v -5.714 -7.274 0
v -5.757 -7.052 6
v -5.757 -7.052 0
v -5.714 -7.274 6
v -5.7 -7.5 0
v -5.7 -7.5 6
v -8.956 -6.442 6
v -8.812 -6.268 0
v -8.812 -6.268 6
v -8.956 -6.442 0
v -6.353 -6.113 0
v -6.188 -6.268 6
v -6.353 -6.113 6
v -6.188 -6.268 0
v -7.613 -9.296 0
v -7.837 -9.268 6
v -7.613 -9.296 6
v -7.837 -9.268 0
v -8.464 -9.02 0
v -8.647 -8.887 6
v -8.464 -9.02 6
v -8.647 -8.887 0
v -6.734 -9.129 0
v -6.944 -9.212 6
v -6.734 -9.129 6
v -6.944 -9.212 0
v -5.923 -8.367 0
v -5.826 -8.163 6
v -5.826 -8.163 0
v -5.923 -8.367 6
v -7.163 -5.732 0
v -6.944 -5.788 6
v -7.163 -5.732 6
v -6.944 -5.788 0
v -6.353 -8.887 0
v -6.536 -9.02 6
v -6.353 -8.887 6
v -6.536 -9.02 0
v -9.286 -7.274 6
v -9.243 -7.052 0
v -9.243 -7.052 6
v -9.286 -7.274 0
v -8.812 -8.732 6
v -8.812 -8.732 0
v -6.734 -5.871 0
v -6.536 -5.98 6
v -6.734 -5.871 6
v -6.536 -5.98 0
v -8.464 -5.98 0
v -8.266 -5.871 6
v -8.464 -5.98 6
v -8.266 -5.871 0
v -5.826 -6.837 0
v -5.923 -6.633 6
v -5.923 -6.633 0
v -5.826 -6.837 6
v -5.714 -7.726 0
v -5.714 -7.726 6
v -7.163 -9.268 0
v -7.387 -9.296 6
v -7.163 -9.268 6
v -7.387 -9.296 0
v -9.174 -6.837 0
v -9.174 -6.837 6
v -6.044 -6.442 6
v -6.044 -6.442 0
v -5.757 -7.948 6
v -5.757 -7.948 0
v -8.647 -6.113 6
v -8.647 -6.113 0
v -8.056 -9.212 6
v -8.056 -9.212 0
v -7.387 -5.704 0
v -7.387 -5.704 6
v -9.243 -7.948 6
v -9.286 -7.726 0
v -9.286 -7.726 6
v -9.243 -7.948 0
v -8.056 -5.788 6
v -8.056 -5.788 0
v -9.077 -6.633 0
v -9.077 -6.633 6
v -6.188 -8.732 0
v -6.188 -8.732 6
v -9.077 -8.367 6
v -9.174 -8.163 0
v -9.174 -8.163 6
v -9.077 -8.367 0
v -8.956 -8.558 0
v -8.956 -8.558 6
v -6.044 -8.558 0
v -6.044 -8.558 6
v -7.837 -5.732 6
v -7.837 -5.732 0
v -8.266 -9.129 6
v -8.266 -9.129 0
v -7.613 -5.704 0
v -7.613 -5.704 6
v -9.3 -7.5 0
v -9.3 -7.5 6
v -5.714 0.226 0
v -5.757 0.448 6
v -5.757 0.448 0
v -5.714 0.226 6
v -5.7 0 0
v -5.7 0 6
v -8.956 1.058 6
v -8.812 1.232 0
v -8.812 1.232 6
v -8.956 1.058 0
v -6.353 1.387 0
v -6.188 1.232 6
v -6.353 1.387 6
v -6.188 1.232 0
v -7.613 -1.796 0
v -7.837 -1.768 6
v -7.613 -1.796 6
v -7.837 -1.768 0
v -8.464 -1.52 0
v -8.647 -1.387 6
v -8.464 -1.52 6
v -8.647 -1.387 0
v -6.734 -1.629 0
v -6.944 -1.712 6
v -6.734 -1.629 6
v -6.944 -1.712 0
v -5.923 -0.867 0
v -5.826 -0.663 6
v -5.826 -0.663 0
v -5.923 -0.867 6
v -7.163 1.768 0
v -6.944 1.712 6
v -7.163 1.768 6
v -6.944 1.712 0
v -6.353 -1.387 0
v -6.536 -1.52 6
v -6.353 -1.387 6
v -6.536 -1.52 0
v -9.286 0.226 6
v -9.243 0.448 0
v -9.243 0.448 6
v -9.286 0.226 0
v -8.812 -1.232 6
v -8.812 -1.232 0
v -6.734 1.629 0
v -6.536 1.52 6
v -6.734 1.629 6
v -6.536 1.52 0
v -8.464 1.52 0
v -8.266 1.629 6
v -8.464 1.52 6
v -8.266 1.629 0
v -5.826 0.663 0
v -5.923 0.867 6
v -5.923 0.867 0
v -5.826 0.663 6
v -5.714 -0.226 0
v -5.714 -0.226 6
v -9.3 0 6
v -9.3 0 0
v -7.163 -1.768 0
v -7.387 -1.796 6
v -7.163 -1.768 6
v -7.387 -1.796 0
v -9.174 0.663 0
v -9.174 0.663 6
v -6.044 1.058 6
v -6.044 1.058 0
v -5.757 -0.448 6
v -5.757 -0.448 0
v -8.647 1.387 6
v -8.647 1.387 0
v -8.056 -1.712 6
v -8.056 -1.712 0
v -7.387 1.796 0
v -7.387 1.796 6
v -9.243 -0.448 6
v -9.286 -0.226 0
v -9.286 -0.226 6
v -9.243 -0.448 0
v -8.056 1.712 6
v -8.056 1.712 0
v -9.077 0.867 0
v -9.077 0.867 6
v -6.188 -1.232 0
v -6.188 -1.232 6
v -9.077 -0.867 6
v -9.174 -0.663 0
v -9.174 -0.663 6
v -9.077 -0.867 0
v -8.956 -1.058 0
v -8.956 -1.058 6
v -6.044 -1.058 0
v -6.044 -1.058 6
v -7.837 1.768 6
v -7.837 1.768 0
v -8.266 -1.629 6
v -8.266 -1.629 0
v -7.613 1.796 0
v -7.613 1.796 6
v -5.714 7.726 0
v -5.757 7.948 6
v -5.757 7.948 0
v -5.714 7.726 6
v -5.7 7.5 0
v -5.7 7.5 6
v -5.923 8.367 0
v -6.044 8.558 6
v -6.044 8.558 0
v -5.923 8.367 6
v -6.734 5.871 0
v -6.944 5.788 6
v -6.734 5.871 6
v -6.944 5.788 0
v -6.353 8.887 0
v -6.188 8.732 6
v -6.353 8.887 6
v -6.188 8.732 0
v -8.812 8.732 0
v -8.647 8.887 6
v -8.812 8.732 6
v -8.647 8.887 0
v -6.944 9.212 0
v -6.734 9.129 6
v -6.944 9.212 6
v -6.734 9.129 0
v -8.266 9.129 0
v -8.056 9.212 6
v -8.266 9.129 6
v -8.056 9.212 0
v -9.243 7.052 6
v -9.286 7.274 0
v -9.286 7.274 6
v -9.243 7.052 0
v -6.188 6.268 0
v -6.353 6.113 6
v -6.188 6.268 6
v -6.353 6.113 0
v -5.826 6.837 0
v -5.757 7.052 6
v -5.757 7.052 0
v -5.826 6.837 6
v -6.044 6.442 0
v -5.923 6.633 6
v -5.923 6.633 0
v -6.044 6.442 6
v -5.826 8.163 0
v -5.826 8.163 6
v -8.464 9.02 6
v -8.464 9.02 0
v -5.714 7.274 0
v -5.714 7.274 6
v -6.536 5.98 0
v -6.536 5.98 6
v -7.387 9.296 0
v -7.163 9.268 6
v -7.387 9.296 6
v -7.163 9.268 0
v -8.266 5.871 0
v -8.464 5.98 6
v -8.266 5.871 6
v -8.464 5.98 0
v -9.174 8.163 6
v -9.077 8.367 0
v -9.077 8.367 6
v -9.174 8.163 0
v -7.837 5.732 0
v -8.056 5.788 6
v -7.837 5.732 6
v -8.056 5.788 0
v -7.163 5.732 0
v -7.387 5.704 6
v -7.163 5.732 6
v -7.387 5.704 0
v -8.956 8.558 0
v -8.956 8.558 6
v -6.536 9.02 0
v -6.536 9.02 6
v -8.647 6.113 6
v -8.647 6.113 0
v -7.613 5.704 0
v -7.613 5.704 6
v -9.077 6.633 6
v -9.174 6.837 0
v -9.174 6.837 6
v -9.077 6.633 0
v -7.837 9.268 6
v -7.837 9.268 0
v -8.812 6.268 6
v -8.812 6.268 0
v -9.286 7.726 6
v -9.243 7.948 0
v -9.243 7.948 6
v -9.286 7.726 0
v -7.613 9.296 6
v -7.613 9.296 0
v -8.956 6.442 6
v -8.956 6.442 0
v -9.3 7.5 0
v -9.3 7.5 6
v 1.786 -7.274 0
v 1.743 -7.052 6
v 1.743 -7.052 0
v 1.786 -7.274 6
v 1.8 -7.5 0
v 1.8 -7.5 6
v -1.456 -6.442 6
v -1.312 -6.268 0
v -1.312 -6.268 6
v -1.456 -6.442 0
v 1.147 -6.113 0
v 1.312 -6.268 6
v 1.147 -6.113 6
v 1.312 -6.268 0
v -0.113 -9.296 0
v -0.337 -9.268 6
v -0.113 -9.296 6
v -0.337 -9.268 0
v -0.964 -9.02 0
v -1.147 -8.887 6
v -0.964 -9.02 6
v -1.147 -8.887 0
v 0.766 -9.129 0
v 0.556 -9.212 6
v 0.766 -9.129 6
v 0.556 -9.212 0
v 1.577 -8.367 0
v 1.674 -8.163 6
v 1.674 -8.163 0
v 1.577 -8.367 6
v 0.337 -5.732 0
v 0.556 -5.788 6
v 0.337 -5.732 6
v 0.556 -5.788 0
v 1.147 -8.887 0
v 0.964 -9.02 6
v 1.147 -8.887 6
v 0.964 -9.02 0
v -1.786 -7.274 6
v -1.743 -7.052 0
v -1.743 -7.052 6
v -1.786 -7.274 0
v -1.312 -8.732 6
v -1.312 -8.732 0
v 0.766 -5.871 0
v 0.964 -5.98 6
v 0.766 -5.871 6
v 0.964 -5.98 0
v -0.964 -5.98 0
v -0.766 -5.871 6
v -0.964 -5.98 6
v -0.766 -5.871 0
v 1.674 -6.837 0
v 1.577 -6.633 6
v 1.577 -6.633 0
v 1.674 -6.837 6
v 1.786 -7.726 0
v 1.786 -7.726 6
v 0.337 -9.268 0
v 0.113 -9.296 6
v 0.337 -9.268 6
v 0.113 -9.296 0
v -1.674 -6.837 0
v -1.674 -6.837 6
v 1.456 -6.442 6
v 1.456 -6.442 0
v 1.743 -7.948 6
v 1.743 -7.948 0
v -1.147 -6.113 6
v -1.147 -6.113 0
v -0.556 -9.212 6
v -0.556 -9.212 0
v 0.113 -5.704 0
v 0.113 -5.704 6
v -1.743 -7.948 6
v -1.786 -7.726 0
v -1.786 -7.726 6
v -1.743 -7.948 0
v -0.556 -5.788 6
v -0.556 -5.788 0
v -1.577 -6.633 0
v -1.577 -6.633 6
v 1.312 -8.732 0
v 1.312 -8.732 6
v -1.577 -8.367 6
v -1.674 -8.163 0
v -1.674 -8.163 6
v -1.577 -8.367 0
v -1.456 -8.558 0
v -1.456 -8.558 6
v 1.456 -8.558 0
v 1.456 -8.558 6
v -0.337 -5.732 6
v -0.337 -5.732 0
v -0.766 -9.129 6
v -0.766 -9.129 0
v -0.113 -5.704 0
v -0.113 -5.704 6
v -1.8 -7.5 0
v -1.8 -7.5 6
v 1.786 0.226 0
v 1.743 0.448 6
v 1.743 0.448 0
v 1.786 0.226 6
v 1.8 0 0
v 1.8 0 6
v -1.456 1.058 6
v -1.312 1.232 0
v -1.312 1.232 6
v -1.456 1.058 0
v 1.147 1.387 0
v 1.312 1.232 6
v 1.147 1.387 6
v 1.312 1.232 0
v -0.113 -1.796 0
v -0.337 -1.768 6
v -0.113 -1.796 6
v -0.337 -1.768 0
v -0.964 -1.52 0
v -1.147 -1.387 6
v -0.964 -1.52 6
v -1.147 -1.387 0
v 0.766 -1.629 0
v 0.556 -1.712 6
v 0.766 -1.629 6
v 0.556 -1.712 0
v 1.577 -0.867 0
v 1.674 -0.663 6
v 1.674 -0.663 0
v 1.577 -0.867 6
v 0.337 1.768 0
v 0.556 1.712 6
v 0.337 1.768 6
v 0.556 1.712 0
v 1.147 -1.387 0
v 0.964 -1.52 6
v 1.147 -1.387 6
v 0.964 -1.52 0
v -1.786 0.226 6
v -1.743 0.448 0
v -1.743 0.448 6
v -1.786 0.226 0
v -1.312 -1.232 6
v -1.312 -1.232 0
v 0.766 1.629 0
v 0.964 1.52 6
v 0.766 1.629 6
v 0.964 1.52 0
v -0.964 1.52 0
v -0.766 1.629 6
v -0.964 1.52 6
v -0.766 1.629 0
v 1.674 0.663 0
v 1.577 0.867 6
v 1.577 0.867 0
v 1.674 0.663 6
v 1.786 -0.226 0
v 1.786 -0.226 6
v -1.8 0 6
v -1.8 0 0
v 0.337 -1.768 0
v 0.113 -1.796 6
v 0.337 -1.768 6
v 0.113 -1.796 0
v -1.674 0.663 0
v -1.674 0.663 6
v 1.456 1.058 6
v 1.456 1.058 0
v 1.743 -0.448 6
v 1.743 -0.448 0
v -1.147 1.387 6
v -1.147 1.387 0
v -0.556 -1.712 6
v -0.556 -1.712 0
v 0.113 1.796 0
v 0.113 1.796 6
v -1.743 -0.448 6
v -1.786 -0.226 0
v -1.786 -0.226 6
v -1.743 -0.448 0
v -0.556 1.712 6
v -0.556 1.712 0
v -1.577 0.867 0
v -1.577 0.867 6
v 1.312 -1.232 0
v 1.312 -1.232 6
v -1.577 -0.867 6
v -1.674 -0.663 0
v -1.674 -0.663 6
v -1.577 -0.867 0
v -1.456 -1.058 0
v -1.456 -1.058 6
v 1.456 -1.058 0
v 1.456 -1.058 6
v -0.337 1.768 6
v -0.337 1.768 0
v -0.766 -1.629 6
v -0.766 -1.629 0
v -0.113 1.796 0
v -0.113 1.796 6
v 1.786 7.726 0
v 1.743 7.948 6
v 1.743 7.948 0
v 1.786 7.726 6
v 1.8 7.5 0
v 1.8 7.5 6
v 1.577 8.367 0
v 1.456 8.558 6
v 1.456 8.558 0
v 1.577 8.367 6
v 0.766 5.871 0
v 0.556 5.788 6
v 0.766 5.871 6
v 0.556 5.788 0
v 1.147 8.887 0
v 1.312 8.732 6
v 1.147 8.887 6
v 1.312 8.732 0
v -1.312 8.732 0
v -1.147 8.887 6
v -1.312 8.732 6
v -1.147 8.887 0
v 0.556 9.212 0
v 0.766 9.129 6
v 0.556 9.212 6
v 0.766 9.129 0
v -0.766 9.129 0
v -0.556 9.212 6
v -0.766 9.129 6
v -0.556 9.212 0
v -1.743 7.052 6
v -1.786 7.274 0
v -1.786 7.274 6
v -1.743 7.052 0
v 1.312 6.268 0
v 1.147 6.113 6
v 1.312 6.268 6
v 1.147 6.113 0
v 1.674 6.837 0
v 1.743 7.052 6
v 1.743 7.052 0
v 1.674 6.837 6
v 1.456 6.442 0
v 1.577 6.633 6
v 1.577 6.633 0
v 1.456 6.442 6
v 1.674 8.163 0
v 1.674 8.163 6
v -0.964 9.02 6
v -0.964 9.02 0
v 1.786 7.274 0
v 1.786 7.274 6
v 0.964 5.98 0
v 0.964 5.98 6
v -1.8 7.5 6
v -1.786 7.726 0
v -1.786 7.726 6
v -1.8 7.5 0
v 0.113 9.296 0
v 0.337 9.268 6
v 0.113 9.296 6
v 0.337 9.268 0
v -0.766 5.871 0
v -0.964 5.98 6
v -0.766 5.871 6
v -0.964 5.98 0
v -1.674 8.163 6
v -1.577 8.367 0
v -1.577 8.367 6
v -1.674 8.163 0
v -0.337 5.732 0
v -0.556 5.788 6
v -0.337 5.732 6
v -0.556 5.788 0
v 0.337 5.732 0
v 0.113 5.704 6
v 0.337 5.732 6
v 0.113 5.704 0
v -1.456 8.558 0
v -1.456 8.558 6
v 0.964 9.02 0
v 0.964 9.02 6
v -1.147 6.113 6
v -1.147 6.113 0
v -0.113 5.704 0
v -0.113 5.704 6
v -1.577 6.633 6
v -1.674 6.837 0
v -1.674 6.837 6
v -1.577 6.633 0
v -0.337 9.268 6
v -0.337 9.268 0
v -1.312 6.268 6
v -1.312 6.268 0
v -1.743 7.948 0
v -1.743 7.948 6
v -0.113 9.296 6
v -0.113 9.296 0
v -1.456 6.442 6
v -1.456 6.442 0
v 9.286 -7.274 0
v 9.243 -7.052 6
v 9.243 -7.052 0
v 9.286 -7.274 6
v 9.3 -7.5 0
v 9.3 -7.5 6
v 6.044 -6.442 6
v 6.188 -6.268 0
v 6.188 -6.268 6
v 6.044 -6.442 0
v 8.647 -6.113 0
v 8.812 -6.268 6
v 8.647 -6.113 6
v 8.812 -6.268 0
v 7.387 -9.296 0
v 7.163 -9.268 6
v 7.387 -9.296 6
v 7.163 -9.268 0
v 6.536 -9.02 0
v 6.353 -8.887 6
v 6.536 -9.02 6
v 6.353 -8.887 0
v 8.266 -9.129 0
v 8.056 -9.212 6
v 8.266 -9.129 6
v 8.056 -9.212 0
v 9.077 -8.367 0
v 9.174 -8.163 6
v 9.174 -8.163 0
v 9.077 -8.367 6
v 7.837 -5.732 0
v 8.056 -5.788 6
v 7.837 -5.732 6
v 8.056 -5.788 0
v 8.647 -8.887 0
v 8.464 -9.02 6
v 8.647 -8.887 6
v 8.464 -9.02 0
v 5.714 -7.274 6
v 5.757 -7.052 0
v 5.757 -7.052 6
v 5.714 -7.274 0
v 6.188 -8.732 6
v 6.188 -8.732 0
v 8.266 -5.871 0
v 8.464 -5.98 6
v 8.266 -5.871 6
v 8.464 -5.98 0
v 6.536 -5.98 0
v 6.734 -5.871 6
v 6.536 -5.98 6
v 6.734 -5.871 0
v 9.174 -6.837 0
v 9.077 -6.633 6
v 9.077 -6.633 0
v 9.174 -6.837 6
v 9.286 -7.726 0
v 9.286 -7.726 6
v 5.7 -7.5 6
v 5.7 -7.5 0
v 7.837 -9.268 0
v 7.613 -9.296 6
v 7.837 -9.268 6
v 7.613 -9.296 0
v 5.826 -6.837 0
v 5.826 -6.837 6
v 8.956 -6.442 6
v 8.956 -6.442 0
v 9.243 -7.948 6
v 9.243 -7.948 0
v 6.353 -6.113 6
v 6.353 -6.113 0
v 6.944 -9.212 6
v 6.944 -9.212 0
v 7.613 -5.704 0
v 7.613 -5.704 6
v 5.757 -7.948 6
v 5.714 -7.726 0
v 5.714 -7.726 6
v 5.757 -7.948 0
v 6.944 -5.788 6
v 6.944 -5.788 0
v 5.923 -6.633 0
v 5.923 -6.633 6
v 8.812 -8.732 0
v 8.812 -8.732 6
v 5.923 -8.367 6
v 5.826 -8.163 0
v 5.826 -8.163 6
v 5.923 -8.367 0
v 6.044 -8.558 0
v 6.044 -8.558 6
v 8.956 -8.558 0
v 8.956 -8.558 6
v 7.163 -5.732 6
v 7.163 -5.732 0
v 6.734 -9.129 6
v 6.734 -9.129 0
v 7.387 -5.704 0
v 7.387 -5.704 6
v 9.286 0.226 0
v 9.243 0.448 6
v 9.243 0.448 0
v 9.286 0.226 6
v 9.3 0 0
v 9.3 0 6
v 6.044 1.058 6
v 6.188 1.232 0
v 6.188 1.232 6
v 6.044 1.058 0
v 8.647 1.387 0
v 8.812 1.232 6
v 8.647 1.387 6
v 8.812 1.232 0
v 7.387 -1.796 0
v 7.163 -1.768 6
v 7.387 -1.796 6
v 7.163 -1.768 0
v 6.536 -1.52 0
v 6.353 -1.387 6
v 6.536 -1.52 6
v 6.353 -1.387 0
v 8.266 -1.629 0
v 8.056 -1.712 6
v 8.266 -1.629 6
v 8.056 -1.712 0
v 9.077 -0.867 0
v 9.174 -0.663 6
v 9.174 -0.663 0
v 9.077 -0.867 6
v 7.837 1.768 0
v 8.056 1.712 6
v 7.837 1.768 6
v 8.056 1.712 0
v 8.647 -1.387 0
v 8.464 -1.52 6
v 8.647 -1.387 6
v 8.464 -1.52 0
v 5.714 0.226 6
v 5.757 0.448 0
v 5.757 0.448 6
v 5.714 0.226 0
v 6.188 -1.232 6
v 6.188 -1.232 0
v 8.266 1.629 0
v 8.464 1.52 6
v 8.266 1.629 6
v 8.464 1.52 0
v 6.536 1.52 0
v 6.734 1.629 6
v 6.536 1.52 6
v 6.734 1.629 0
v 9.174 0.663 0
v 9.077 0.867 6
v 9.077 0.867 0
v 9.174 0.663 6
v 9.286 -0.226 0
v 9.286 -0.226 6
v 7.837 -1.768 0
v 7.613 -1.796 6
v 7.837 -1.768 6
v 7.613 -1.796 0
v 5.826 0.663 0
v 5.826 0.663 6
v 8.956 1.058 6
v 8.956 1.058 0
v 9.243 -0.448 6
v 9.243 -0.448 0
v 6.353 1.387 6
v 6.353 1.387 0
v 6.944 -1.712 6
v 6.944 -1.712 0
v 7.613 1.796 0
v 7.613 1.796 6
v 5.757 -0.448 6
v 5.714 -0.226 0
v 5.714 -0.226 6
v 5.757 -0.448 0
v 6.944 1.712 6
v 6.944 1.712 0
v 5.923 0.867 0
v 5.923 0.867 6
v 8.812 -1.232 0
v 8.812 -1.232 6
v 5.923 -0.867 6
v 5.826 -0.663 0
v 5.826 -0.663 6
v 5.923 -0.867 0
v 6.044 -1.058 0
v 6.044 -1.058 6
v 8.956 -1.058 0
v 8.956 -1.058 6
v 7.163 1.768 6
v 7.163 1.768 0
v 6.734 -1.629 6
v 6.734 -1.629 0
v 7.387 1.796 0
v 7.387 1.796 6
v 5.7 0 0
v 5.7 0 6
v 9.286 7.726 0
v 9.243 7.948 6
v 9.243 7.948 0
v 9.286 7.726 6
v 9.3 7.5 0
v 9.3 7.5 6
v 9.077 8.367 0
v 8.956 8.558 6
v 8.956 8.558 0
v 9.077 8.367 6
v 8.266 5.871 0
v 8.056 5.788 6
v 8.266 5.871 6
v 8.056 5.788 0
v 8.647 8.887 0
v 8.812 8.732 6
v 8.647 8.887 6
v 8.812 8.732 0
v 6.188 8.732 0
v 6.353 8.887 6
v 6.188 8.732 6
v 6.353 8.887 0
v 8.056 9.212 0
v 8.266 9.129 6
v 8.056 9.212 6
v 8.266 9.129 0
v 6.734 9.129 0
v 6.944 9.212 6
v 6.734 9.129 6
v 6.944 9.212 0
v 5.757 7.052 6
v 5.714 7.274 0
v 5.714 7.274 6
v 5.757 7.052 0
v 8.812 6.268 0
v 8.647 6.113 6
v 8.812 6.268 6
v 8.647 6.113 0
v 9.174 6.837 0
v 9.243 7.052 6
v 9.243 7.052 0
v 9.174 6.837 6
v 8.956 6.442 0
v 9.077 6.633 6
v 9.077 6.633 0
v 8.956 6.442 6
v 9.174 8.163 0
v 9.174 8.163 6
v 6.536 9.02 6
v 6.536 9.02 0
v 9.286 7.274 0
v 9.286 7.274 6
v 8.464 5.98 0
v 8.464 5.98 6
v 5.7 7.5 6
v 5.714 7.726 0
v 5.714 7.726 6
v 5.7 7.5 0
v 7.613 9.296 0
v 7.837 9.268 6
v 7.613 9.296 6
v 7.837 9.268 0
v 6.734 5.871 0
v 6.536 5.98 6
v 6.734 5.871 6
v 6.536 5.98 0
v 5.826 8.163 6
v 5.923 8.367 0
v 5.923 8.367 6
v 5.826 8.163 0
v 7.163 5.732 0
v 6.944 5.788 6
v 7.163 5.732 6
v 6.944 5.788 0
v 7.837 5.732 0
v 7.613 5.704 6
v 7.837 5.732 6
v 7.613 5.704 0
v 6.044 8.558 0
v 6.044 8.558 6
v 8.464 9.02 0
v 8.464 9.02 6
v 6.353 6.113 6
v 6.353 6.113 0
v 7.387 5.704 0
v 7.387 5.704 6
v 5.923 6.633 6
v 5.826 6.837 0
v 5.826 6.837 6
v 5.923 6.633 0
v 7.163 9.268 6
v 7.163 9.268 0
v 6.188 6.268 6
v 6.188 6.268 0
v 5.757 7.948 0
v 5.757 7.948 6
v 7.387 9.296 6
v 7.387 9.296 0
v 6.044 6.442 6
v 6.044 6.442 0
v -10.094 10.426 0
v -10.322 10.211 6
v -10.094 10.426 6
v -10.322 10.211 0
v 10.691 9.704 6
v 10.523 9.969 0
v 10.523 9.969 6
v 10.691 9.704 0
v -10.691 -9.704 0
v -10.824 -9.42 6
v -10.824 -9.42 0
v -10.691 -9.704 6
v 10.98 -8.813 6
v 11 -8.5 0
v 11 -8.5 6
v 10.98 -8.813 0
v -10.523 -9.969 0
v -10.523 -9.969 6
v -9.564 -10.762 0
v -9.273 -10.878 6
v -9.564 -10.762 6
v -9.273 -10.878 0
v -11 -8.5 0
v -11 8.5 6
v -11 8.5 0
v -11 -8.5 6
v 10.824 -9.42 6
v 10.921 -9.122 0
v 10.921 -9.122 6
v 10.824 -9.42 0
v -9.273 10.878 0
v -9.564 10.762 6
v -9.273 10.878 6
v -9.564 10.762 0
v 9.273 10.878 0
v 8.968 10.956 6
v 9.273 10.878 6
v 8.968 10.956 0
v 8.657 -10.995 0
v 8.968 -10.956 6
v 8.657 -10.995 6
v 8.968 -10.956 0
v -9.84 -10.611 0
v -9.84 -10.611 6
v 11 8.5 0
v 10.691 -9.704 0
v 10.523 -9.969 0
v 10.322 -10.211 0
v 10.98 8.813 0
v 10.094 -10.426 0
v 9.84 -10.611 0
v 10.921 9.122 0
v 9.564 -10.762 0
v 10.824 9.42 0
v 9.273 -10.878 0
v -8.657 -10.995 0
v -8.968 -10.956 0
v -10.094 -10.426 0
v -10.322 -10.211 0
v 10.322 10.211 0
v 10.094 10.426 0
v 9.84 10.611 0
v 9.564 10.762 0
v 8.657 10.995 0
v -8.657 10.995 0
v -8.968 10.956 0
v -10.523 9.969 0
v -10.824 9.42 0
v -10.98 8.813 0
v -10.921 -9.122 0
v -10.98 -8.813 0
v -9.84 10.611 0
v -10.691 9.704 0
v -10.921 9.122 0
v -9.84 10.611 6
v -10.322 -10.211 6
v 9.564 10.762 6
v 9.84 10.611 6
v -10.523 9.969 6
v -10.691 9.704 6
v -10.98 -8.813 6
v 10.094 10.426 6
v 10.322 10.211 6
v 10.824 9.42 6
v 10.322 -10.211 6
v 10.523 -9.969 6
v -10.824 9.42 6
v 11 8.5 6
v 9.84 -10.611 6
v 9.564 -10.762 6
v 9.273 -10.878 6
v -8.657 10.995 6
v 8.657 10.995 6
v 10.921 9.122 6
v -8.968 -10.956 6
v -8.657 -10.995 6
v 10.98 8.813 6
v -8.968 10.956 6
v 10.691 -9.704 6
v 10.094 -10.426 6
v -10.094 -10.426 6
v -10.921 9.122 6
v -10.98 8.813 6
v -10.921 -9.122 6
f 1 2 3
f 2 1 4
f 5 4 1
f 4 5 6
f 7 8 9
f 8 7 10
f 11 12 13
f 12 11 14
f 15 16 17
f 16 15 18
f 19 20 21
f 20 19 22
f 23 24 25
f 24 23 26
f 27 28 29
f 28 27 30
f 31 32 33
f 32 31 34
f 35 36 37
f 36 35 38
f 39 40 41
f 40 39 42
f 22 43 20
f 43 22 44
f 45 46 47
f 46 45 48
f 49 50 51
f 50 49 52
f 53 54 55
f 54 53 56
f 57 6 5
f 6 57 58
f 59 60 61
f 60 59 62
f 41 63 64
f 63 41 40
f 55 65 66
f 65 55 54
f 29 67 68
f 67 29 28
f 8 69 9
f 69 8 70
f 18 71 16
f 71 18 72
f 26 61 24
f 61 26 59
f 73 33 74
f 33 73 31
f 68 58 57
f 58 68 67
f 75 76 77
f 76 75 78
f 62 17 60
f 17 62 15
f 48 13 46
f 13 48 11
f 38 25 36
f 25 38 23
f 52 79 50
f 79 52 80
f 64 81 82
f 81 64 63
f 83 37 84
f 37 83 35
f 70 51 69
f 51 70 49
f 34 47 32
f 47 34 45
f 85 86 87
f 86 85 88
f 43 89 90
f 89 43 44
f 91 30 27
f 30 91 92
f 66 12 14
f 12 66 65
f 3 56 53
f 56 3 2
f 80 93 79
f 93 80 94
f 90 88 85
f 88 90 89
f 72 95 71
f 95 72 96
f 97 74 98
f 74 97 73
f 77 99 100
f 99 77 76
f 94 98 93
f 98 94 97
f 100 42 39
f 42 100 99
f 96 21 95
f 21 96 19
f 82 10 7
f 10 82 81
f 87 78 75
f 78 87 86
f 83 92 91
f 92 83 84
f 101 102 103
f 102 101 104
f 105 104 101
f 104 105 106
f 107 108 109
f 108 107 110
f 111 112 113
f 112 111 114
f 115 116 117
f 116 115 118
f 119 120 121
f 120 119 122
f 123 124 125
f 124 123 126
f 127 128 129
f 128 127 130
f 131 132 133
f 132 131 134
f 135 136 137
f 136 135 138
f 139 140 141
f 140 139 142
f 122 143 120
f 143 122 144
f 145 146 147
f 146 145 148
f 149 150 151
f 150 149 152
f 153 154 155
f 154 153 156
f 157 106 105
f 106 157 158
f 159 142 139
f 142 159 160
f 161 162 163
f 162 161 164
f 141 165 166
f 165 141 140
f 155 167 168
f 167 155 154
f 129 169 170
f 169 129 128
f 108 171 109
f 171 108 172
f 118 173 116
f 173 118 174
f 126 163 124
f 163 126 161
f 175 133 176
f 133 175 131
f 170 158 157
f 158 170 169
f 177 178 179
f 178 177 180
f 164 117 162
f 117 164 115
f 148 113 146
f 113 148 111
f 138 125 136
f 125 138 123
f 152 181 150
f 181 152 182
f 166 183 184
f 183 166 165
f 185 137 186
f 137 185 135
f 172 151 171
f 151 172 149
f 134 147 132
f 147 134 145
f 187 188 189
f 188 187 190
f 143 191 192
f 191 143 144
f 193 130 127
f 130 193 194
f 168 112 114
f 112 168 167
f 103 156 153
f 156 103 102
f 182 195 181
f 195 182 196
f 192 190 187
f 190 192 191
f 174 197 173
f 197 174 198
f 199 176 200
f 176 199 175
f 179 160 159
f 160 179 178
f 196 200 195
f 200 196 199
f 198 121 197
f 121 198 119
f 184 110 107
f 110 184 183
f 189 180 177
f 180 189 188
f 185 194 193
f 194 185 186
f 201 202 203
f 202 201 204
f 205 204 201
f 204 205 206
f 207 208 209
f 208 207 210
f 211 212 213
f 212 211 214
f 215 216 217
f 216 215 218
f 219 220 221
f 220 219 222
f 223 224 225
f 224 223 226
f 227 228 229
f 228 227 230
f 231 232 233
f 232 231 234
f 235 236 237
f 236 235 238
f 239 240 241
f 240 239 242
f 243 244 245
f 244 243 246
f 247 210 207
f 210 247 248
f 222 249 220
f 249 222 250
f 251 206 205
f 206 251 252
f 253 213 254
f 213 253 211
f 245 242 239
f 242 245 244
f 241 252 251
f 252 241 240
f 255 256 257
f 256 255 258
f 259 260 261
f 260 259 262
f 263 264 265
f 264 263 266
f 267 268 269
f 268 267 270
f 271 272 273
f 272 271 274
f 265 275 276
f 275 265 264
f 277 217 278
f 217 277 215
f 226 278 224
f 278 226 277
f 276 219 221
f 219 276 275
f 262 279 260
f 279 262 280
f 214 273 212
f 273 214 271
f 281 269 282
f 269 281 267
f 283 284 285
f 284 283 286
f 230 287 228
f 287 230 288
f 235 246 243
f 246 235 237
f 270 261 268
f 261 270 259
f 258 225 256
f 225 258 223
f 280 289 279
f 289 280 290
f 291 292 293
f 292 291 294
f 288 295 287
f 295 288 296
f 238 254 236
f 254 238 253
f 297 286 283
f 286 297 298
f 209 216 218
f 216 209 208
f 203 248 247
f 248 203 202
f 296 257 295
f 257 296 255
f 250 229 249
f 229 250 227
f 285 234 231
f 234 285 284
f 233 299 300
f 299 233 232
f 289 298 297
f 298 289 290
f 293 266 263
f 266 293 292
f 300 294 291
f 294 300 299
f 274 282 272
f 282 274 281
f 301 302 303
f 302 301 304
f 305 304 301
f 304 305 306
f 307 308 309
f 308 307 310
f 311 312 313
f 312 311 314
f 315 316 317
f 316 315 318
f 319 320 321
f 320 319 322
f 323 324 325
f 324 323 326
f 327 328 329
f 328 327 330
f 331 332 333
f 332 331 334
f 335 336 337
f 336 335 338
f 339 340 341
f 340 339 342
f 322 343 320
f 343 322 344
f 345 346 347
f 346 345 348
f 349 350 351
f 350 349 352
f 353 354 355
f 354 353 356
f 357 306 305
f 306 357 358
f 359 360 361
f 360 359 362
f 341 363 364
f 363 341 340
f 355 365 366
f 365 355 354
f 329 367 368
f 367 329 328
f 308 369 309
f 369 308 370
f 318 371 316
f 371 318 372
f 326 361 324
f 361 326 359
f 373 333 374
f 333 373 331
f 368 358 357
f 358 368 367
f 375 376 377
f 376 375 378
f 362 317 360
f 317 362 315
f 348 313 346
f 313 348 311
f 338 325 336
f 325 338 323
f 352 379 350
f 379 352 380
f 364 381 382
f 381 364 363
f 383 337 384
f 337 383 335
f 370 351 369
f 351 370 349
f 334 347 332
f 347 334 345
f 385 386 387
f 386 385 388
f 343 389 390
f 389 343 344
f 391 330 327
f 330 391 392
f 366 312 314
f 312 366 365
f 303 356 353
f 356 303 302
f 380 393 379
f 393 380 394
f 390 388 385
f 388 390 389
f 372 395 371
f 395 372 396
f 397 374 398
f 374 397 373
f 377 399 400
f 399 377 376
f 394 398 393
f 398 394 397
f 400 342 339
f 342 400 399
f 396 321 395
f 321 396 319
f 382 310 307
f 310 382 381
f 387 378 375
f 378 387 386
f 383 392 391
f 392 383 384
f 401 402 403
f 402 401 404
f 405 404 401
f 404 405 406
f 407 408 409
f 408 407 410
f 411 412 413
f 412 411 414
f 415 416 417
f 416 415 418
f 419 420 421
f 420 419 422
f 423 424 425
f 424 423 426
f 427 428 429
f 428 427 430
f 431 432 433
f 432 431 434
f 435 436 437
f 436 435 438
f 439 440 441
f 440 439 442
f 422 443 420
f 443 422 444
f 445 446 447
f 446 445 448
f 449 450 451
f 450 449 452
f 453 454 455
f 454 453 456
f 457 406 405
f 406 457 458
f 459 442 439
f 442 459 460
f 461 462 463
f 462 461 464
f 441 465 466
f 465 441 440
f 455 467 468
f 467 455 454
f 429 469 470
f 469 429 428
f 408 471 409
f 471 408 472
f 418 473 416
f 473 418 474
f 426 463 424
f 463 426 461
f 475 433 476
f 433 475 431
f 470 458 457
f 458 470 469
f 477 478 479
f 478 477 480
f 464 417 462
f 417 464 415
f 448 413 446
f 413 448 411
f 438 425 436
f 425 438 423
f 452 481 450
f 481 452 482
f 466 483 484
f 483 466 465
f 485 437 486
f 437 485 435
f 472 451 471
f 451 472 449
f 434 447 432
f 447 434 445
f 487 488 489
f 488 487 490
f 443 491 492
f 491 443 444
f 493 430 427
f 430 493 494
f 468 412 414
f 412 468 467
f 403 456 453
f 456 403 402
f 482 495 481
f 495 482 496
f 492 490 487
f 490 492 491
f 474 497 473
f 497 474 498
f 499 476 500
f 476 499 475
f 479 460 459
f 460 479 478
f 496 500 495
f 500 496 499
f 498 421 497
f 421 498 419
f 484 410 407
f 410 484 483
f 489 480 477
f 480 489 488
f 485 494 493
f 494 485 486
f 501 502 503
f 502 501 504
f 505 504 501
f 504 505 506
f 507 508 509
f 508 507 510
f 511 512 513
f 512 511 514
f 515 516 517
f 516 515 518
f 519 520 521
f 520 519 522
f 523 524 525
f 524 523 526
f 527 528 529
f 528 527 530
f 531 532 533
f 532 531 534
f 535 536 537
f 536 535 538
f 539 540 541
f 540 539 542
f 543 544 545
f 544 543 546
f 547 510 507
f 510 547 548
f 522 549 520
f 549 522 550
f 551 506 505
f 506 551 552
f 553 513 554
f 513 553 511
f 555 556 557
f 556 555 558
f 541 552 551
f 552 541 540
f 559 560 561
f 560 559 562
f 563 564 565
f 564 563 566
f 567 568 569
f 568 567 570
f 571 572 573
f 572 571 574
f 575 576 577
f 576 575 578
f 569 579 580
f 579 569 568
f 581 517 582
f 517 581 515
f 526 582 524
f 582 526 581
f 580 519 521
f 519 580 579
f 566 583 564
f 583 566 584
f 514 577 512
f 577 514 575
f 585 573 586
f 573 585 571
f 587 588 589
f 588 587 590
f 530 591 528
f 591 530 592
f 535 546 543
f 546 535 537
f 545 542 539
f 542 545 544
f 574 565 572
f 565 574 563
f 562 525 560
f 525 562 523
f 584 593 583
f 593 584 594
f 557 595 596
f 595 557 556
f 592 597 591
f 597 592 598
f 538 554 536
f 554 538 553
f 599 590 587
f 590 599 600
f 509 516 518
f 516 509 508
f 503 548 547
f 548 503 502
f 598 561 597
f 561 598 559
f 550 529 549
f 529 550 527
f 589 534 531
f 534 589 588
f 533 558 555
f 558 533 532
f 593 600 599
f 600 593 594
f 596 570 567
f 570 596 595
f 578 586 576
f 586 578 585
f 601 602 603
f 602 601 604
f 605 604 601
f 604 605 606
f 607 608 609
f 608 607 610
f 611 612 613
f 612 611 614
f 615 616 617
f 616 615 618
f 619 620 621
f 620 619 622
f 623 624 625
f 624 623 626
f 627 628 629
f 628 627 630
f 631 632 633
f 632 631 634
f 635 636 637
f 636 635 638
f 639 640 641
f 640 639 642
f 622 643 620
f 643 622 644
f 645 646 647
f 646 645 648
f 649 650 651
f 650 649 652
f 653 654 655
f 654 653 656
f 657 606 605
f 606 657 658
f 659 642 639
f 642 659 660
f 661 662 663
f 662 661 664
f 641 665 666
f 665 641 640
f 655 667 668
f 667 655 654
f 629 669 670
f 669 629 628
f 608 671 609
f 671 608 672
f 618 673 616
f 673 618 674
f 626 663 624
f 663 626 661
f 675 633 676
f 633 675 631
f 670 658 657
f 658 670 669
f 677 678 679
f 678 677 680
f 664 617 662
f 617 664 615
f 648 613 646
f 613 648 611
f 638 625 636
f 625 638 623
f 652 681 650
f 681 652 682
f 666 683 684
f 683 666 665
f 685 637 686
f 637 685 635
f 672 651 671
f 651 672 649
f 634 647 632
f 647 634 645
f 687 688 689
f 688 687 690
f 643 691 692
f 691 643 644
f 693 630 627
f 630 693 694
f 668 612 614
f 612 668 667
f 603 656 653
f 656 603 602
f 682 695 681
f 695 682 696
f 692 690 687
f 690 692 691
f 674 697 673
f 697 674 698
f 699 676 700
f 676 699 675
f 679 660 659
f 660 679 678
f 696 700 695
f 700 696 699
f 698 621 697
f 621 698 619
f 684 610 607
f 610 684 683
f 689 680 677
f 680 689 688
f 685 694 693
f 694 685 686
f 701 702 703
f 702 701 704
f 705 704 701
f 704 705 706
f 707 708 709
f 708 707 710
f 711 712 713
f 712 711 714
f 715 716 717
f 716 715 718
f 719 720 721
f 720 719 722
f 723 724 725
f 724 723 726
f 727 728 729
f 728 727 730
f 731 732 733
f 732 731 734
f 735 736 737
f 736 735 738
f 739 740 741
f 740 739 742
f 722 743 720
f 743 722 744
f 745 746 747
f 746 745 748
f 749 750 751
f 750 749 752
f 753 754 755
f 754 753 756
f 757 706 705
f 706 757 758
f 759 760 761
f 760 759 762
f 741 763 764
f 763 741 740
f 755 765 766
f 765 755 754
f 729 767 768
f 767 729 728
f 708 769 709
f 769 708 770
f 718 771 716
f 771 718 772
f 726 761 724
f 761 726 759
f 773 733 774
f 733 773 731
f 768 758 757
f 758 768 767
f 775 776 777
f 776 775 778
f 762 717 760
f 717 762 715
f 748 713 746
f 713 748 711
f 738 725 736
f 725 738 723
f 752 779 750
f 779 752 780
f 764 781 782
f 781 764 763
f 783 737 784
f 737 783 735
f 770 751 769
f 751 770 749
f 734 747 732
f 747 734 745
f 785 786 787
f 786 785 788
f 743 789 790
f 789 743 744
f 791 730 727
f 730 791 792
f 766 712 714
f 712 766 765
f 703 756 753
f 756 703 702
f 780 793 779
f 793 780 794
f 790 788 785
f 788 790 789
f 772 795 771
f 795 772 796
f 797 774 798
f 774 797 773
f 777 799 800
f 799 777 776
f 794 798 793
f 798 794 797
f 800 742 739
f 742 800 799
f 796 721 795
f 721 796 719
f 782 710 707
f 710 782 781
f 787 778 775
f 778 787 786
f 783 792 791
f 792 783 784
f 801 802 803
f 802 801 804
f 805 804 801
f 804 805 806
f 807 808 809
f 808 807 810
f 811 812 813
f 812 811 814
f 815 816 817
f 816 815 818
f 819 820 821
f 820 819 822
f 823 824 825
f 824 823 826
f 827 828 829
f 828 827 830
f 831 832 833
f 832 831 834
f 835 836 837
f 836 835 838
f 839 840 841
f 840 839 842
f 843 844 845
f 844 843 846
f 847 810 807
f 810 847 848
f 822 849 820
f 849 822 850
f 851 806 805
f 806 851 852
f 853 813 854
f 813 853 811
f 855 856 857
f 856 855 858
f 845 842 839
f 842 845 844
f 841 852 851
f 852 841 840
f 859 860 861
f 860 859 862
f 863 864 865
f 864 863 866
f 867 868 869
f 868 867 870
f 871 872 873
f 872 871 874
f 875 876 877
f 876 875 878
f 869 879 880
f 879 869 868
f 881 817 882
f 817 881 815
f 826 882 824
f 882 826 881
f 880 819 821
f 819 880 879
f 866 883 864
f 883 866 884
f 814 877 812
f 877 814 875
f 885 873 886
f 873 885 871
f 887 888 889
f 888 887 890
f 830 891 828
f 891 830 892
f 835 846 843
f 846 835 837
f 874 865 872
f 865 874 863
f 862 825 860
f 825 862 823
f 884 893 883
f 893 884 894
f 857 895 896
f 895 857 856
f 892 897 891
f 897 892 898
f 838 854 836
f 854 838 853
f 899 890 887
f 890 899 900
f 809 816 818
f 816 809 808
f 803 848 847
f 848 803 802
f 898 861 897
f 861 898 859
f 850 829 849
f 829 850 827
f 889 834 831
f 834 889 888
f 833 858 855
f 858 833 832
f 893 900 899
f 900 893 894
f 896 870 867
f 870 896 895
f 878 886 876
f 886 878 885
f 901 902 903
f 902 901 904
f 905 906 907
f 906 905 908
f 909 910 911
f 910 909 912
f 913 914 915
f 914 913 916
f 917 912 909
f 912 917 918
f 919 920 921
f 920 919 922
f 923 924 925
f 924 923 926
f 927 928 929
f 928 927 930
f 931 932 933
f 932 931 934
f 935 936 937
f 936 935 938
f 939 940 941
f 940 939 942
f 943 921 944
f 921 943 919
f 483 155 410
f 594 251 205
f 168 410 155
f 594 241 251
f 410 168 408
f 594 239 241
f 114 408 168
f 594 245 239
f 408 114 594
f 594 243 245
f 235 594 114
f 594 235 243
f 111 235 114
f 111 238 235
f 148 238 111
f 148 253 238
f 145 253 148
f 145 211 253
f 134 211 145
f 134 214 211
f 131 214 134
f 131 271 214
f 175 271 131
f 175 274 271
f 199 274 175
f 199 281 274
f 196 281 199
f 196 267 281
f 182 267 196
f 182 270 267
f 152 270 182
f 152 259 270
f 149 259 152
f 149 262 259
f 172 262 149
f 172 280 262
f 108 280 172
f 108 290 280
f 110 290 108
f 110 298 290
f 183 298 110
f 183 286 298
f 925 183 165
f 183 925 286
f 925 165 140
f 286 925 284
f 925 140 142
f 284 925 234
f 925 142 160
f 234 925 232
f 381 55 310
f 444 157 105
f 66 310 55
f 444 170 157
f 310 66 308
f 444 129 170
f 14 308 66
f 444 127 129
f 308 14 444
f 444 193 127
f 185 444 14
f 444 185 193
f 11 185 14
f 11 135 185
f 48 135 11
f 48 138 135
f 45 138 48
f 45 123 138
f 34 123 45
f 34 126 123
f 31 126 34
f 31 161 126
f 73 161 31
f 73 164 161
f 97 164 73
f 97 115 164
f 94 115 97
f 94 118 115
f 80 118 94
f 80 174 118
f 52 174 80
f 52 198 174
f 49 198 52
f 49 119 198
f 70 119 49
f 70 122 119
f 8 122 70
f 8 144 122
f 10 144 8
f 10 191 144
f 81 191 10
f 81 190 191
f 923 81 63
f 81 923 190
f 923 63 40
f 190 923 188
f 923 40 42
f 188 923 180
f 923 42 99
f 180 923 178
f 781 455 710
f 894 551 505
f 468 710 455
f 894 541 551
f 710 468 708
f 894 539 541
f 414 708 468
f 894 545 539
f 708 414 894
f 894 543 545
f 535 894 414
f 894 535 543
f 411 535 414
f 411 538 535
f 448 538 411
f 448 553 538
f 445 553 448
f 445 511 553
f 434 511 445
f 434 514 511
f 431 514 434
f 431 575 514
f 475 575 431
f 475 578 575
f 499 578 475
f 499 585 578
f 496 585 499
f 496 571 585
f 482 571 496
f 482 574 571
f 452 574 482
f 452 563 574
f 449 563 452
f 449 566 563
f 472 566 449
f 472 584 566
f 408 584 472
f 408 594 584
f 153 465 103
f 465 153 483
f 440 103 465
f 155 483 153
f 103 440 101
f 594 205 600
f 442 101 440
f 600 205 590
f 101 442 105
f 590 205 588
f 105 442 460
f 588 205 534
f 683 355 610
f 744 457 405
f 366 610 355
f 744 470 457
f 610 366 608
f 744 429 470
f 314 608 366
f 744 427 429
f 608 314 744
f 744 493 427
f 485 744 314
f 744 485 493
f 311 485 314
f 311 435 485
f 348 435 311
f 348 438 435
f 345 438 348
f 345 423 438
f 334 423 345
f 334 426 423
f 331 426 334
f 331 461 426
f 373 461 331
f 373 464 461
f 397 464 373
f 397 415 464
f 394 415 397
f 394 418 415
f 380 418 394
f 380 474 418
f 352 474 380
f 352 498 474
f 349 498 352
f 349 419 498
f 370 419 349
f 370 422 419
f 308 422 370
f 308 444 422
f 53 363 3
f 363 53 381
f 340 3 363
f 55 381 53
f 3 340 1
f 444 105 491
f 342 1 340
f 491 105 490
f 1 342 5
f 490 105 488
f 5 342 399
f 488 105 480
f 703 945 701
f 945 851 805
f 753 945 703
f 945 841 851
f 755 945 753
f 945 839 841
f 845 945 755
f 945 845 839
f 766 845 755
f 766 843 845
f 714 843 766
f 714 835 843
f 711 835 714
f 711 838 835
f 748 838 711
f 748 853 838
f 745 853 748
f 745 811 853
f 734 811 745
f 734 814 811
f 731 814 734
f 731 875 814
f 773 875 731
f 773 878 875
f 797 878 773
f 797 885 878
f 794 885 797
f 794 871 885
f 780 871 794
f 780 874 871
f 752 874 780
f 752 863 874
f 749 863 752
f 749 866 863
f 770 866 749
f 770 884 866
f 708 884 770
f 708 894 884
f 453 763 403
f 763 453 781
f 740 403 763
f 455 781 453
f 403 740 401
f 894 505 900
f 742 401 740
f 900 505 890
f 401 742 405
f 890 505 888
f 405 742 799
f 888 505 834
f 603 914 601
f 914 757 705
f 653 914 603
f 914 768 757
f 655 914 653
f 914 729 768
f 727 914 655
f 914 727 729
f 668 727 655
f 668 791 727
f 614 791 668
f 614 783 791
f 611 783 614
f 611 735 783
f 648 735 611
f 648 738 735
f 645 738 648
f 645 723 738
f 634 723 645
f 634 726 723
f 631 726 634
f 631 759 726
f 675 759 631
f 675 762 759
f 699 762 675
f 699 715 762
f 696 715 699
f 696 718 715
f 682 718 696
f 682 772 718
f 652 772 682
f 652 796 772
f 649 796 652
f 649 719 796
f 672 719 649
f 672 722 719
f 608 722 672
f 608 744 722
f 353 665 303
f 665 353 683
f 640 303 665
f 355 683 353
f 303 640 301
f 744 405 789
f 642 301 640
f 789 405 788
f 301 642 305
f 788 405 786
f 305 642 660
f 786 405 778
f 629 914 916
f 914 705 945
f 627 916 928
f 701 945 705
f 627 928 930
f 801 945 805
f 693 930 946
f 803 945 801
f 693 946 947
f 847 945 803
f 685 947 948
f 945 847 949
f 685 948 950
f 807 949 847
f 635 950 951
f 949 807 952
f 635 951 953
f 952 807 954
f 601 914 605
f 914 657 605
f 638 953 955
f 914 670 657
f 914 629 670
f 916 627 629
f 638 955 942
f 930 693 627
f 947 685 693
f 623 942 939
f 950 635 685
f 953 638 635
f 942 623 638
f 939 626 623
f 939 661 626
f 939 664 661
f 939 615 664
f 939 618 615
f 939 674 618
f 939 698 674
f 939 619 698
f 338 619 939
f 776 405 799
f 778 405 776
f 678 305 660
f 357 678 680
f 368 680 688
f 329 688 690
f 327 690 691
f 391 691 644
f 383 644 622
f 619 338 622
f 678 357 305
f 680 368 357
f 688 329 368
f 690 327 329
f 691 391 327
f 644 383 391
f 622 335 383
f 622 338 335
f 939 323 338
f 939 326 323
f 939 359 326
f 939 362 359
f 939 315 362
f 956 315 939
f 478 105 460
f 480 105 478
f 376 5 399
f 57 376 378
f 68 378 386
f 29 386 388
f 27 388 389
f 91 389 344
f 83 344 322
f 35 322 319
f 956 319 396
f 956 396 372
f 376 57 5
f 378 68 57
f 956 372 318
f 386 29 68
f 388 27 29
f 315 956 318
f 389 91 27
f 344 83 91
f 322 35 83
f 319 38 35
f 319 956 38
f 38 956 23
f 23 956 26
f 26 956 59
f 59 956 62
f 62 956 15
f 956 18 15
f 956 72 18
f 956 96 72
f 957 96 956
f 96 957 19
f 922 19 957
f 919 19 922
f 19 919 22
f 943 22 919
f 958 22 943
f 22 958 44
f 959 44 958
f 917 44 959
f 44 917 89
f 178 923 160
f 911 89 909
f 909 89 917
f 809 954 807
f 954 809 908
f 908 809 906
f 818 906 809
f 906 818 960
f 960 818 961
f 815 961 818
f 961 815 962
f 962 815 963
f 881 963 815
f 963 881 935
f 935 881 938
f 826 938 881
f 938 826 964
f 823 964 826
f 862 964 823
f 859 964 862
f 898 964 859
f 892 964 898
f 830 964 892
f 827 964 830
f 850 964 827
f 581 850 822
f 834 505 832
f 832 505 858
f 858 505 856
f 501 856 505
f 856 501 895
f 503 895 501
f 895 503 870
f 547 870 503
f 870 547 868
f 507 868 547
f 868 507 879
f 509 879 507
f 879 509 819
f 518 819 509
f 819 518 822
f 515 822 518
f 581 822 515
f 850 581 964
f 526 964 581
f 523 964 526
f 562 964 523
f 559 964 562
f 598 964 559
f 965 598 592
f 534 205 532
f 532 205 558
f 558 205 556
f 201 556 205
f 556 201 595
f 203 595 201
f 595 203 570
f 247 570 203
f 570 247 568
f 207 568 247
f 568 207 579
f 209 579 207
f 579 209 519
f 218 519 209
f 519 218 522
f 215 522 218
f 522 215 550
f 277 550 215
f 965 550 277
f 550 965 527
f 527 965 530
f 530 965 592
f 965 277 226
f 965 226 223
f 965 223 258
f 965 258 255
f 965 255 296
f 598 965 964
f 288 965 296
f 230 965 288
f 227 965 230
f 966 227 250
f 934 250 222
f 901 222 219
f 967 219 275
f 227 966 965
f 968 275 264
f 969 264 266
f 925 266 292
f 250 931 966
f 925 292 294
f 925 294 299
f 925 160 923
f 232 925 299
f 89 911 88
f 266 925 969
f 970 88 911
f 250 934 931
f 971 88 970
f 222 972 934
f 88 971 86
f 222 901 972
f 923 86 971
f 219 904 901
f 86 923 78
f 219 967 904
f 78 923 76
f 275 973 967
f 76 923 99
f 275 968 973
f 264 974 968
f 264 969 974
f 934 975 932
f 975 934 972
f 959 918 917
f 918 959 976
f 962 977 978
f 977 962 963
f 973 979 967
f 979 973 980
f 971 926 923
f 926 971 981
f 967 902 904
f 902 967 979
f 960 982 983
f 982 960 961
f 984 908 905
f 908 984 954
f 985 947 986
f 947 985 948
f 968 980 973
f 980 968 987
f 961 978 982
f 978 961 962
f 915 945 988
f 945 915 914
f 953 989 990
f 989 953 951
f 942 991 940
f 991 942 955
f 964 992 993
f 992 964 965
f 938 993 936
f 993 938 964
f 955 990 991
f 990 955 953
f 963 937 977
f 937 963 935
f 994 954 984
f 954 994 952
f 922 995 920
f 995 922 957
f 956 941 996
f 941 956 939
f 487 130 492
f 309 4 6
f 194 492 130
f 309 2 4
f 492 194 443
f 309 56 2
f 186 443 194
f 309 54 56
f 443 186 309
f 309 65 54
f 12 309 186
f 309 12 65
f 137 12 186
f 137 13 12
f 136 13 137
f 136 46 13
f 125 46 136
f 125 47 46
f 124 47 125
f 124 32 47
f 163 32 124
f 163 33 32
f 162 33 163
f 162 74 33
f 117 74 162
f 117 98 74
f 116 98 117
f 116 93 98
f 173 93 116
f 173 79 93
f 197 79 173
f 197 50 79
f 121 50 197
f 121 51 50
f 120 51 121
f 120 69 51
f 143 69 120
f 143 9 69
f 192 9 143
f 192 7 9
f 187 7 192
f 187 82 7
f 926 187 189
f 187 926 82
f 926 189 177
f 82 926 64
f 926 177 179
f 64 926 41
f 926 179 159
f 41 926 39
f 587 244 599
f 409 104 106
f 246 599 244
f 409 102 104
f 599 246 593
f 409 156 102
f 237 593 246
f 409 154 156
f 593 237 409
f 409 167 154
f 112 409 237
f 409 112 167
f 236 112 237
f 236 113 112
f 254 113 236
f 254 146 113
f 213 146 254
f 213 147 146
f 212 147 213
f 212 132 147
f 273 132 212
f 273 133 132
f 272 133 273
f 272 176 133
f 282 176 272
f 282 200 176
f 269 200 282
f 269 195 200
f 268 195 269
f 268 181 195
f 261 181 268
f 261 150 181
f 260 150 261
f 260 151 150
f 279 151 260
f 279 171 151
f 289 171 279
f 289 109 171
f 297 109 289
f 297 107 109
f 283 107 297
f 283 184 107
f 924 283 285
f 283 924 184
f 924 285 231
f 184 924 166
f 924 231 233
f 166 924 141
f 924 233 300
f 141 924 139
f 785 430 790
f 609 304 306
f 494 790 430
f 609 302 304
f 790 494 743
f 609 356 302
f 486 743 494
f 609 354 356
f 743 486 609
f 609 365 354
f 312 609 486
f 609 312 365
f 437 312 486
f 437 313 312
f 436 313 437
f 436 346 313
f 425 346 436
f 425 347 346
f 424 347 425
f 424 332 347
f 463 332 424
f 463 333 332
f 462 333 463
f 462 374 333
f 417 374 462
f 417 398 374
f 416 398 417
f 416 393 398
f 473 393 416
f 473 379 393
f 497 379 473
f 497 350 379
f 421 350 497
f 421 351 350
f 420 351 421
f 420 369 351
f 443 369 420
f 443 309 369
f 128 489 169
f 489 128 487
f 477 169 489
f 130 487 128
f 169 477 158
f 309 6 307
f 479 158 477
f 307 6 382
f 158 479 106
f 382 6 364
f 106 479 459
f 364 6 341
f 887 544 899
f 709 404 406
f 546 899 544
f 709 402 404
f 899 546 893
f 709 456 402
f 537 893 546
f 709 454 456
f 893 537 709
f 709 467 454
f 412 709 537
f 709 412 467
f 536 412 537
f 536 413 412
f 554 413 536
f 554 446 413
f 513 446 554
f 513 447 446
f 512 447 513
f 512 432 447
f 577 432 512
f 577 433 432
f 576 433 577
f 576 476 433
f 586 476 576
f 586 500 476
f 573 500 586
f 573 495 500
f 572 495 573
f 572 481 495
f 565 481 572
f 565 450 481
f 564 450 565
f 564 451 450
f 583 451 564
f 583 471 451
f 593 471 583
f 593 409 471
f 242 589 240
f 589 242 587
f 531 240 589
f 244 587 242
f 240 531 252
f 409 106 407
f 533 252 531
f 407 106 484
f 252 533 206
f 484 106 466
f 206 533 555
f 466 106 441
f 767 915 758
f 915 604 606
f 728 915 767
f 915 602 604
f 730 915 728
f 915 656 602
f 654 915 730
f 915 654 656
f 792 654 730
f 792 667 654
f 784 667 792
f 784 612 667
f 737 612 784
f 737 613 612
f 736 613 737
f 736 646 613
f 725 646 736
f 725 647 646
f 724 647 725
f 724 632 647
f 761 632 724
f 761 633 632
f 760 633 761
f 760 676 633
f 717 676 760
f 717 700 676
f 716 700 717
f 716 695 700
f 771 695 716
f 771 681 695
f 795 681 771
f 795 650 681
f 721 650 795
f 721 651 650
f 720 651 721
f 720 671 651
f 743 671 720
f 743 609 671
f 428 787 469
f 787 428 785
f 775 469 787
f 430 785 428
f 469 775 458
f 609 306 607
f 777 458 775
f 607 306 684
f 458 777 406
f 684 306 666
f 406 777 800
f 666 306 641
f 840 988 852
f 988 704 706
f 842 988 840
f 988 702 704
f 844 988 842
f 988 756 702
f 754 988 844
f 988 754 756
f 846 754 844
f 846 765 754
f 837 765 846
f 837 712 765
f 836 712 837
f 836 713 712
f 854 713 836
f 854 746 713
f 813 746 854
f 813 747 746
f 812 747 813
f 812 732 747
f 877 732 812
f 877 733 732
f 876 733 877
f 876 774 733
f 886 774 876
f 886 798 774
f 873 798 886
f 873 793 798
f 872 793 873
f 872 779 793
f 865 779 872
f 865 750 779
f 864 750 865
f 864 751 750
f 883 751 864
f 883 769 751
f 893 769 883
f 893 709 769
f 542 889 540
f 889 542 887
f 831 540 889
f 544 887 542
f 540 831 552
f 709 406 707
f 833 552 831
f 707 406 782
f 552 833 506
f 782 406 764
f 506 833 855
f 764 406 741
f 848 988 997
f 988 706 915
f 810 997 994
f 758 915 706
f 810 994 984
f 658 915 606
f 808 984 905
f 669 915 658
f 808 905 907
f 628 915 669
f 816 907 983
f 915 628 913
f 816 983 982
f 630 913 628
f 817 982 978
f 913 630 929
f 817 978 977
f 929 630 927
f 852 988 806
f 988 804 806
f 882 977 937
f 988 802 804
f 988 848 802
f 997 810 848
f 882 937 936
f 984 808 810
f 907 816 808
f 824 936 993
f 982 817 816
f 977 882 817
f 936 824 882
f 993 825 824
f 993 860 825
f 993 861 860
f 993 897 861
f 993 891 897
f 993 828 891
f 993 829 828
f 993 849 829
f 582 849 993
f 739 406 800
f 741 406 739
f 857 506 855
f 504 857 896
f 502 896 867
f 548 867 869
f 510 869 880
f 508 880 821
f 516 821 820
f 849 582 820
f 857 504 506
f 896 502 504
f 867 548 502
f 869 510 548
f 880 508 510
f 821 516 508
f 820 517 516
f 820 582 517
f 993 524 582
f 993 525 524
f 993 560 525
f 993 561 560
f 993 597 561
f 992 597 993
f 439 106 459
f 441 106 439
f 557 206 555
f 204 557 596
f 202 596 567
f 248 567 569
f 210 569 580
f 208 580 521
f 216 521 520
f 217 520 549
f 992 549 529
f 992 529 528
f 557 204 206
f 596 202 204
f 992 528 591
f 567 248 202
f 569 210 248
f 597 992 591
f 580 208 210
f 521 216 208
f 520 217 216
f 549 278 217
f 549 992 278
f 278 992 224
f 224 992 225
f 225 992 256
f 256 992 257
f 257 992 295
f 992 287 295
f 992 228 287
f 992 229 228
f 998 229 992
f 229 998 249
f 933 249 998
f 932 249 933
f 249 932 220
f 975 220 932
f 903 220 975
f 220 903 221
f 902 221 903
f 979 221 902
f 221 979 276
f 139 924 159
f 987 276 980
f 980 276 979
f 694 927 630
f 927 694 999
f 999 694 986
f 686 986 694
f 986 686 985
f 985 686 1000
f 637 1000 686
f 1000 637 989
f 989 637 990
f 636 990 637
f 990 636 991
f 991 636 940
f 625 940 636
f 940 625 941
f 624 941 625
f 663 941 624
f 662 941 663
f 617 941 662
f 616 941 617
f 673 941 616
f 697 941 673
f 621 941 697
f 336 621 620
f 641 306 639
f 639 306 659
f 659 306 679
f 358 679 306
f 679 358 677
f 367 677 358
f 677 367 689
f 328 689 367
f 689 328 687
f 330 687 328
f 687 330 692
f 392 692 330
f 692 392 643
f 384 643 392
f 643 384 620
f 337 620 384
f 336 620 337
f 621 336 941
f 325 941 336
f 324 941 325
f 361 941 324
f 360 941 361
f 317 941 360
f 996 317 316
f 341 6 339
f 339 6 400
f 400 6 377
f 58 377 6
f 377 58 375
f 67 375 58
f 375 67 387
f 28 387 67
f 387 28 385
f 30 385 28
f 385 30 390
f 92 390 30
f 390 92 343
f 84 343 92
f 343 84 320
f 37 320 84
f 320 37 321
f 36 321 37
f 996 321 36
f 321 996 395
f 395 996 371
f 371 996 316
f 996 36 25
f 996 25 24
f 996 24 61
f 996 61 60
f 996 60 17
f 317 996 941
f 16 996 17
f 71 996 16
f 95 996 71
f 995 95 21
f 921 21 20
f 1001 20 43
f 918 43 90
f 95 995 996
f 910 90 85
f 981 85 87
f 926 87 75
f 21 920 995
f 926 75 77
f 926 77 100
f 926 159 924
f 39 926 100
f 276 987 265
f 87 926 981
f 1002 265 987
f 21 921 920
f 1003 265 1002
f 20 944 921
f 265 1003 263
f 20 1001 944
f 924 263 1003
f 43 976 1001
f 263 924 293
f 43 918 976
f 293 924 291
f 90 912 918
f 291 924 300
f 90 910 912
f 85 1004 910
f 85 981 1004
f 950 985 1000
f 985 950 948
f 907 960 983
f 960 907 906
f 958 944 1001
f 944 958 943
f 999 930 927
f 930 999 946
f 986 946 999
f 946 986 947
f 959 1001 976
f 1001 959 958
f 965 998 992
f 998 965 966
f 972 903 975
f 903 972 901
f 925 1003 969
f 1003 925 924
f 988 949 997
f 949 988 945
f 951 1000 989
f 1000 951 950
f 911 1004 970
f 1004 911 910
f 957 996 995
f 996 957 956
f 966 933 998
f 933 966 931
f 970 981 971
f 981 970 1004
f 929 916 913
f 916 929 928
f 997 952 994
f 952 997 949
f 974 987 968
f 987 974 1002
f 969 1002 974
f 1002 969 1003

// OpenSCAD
$fn = 50;


difference() {
	union() {
		translate(v = [0, 0, 0]) {
			rotate(a = [0, 0, 0]) {
				hull() {
					translate(v = [-8.5000000000, 8.5000000000, 0]) {
						rotate(a = [0, 0, 0]) {
							translate(v = [0, 0, 0]) {
								rotate(a = [0, 0, 0]) {
									cylinder(h = 6, r = 2.5000000000);
								}
							}
						}
					}
					translate(v = [8.5000000000, 8.5000000000, 0]) {
						rotate(a = [0, 0, 0]) {
							translate(v = [0, 0, 0]) {
								rotate(a = [0, 0, 0]) {
									cylinder(h = 6, r = 2.5000000000);
								}
							}
						}
					}
					translate(v = [-8.5000000000, -8.5000000000, 0]) {
						rotate(a = [0, 0, 0]) {
							translate(v = [0, 0, 0]) {
								rotate(a = [0, 0, 0]) {
									cylinder(h = 6, r = 2.5000000000);
								}
							}
						}
					}
					translate(v = [8.5000000000, -8.5000000000, 0]) {
						rotate(a = [0, 0, 0]) {
							translate(v = [0, 0, 0]) {
								rotate(a = [0, 0, 0]) {
									cylinder(h = 6, r = 2.5000000000);
								}
							}
						}
					}
				}
			}
		}
	}
	union() {
		translate(v = [-7.5000000000, -7.5000000000, 0]) {
			rotate(a = [0, 0, 0]) {
				translate(v = [0, 0, -50]) {
					rotate(a = [0, 0, 0]) {
						cylinder(h = 100, r = 1.8000000000);
					}
				}
			}
		}
		translate(v = [-7.5000000000, 0.0000000000, 0]) {
			rotate(a = [0, 0, 0]) {
				translate(v = [0, 0, -50]) {
					rotate(a = [0, 0, 0]) {
						cylinder(h = 100, r = 1.8000000000);
					}
				}
			}
		}
		translate(v = [-7.5000000000, 7.5000000000, 0]) {
			rotate(a = [0, 0, 0]) {
				translate(v = [0, 0, -50]) {
					rotate(a = [0, 0, 0]) {
						cylinder(h = 100, r = 1.8000000000);
					}
				}
			}
		}
		translate(v = [0.0000000000, -7.5000000000, 0]) {
			rotate(a = [0, 0, 0]) {
				translate(v = [0, 0, -50]) {
					rotate(a = [0, 0, 0]) {
						cylinder(h = 100, r = 1.8000000000);
					}
				}
			}
		}
		translate(v = [0.0000000000, 0.0000000000, 0]) {
			rotate(a = [0, 0, 0]) {
				translate(v = [0, 0, -50]) {
					rotate(a = [0, 0, 0]) {
						cylinder(h = 100, r = 1.8000000000);
					}
				}
			}
		}
		translate(v = [0.0000000000, 7.5000000000, 0]) {
			rotate(a = [0, 0, 0]) {
				translate(v = [0, 0, -50]) {
					rotate(a = [0, 0, 0]) {
						cylinder(h = 100, r = 1.8000000000);
					}
				}
			}
		}
		translate(v = [7.5000000000, -7.5000000000, 0]) {
			rotate(a = [0, 0, 0]) {
				translate(v = [0, 0, -50]) {
					rotate(a = [0, 0, 0]) {
						cylinder(h = 100, r = 1.8000000000);
					}
				}
			}
		}
		translate(v = [7.5000000000, 0.0000000000, 0]) {
			rotate(a = [0, 0, 0]) {
				translate(v = [0, 0, -50]) {
					rotate(a = [0, 0, 0]) {
						cylinder(h = 100, r = 1.8000000000);
					}
				}
			}
		}
		translate(v = [7.5000000000, 7.5000000000, 0]) {
			rotate(a = [0, 0, 0]) {
				translate(v = [0, 0, -50]) {
					rotate(a = [0, 0, 0]) {
						cylinder(h = 100, r = 1.8000000000);
					}
				}
			}
		}
	}
}
